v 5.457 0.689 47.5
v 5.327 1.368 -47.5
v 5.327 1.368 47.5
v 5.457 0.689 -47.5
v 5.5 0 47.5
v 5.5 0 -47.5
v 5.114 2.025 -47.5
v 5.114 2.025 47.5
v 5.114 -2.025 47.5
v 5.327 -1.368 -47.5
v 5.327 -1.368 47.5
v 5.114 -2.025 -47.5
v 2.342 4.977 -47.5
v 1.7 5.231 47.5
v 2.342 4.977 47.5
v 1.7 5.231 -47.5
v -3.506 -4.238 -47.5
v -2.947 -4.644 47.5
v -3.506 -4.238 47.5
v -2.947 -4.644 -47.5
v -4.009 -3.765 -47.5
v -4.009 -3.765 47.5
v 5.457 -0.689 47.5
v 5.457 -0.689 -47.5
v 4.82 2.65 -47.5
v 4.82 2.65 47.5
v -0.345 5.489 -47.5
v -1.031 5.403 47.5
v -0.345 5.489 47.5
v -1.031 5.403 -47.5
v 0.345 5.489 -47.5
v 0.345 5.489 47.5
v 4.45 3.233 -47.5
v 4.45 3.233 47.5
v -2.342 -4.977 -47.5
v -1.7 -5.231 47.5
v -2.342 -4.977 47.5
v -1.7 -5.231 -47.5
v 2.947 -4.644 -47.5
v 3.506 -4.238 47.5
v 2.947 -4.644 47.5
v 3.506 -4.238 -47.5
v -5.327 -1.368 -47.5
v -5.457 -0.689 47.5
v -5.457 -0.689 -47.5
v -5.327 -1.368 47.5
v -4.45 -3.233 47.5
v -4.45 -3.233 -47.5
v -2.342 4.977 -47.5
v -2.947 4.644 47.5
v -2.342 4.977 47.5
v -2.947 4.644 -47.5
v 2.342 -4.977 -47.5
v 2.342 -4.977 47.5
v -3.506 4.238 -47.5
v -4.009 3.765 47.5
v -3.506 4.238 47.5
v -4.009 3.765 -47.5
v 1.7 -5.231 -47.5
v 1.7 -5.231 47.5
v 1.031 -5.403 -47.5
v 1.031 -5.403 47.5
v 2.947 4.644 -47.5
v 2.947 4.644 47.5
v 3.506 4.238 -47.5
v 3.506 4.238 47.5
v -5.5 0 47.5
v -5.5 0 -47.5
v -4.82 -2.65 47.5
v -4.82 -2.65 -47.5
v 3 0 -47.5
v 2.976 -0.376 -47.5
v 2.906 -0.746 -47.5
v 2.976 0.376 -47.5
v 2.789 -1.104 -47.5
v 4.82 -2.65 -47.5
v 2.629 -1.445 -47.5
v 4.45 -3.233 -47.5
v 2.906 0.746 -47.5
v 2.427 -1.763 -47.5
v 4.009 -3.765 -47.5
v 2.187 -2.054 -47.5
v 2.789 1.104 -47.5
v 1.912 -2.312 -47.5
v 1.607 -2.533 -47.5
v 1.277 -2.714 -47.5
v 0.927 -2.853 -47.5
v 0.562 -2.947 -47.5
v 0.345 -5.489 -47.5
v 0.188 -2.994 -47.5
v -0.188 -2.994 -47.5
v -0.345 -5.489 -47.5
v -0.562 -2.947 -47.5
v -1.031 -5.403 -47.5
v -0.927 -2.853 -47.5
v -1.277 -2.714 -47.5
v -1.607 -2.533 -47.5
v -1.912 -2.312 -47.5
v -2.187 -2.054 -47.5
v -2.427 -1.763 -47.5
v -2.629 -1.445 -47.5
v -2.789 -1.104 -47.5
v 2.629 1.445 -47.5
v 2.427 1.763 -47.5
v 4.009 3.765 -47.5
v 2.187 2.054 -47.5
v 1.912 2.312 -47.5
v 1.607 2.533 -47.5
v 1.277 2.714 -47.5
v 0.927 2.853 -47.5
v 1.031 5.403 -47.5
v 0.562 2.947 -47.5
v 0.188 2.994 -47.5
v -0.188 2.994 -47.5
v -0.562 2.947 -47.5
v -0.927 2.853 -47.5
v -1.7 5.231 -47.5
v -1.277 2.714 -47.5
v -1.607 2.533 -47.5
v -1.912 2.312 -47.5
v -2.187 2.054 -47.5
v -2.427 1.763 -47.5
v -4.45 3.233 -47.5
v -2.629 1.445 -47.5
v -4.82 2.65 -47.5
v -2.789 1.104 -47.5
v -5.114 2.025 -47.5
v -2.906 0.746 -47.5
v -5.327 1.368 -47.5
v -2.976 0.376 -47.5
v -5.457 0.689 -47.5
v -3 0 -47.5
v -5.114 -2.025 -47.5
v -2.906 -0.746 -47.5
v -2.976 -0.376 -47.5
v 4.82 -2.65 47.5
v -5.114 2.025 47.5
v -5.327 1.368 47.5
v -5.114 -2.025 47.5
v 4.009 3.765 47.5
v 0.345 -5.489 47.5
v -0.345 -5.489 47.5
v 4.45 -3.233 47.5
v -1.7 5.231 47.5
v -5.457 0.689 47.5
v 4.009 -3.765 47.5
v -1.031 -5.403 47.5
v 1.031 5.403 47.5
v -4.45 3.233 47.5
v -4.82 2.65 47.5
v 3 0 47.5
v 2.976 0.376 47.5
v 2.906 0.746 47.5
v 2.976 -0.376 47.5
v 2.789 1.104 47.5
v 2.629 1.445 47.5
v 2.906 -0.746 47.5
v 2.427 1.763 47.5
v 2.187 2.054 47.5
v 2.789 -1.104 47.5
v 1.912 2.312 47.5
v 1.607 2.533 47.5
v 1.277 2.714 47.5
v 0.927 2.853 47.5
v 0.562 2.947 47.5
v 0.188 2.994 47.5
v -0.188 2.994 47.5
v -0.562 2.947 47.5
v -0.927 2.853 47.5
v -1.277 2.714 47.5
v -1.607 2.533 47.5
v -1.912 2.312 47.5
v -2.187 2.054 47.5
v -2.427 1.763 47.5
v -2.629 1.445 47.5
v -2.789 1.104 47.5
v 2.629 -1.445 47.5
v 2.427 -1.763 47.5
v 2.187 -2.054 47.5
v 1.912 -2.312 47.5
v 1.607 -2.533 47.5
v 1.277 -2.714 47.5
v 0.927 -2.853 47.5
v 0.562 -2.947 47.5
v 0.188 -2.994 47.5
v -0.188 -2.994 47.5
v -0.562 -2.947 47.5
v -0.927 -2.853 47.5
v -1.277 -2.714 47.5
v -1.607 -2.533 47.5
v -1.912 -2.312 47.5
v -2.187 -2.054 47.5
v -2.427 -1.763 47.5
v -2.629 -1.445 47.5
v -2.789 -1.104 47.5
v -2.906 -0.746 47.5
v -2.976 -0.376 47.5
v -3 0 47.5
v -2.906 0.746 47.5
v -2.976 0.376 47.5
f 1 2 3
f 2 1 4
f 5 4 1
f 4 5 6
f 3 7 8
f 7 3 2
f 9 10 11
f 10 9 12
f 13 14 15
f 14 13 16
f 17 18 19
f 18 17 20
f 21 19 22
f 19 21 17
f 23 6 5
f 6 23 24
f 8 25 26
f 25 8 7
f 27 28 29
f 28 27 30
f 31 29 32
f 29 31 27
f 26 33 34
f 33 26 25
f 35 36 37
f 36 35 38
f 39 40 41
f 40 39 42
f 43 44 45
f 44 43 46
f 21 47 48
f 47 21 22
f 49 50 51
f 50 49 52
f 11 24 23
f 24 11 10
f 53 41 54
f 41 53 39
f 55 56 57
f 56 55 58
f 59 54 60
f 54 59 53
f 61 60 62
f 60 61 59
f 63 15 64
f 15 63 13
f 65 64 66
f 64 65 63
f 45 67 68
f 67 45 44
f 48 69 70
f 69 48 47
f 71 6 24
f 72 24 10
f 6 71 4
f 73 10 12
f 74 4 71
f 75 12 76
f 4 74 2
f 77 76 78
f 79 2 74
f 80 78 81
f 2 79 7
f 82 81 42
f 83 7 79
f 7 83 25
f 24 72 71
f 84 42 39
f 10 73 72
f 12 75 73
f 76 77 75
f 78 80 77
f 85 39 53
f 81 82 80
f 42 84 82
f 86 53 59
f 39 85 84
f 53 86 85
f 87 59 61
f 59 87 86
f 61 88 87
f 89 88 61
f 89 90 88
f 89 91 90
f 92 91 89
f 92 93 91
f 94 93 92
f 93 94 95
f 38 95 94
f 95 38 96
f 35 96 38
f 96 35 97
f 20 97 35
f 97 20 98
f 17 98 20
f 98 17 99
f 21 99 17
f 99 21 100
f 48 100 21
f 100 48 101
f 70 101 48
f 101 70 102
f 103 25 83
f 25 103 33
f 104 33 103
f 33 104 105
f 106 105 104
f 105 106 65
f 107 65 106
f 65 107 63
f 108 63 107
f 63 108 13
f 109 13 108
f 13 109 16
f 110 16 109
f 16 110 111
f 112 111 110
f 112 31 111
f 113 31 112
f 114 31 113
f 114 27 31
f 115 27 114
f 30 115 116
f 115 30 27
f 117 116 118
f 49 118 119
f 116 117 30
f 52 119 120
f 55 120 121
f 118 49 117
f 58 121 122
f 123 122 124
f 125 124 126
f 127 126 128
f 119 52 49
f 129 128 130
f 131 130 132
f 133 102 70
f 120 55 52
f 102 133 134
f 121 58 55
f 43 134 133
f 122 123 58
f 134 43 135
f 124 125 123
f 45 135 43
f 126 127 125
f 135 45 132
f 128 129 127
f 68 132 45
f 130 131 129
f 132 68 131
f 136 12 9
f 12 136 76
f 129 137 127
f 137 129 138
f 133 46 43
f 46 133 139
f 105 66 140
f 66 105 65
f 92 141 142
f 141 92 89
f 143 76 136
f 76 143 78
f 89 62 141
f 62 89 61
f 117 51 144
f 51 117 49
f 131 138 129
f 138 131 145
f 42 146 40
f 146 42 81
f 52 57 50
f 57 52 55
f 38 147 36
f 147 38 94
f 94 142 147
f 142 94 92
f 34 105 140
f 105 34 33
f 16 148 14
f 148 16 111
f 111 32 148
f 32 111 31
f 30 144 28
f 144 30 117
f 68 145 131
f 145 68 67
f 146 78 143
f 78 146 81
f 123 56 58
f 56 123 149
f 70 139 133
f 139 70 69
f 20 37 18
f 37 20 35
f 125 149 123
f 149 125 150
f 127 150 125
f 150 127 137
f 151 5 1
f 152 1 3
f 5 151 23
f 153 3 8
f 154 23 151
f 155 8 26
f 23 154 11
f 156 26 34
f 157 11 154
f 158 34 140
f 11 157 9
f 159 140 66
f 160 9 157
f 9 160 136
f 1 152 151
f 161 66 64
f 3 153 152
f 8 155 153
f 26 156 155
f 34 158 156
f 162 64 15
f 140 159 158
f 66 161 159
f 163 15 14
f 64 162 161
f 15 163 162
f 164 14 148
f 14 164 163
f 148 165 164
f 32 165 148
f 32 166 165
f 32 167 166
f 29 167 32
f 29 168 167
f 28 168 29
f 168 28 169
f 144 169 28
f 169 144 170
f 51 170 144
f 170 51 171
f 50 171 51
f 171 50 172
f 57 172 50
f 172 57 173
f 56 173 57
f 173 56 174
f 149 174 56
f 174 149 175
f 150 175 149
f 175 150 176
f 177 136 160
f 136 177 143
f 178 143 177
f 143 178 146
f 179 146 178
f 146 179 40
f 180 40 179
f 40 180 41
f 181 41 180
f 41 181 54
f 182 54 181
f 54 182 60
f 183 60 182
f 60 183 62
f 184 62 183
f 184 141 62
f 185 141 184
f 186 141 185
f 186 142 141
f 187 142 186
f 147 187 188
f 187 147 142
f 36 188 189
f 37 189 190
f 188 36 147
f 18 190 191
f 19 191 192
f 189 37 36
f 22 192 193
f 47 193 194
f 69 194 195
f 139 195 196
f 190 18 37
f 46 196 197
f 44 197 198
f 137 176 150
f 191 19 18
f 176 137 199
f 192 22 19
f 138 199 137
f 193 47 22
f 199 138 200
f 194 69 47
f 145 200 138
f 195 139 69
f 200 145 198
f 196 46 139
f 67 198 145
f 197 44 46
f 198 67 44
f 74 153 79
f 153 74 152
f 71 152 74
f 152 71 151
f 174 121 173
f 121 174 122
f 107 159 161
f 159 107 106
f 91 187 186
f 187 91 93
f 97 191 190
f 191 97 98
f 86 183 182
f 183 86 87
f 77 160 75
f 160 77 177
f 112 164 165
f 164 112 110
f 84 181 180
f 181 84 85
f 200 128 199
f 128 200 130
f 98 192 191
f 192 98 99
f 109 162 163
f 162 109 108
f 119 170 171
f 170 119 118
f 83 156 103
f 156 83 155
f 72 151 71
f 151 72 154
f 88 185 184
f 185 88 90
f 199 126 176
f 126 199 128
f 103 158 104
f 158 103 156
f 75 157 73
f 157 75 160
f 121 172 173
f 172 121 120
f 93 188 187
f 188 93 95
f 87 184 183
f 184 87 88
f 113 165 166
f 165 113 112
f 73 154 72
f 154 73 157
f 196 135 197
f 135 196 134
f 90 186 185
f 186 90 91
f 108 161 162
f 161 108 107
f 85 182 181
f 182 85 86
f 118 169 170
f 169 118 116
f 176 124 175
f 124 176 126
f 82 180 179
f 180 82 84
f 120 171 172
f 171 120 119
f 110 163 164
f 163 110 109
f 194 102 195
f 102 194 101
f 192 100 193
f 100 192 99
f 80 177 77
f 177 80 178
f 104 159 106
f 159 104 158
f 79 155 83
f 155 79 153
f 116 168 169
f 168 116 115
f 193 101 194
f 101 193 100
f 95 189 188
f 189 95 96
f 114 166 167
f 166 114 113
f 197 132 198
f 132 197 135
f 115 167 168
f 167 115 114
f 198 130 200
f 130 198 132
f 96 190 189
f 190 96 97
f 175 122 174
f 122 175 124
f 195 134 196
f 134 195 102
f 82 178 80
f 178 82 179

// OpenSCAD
$fn = 50;


difference() {
	union() {
		translate(v = [0, 0, -47.5000000000]) {
			cylinder(h = 95, r = 5.5000000000);
		}
	}
	union() {
		translate(v = [0, 0, -100.0000000000]) {
			cylinder(h = 200, r = 3.0000000000);
		}
	}
}
